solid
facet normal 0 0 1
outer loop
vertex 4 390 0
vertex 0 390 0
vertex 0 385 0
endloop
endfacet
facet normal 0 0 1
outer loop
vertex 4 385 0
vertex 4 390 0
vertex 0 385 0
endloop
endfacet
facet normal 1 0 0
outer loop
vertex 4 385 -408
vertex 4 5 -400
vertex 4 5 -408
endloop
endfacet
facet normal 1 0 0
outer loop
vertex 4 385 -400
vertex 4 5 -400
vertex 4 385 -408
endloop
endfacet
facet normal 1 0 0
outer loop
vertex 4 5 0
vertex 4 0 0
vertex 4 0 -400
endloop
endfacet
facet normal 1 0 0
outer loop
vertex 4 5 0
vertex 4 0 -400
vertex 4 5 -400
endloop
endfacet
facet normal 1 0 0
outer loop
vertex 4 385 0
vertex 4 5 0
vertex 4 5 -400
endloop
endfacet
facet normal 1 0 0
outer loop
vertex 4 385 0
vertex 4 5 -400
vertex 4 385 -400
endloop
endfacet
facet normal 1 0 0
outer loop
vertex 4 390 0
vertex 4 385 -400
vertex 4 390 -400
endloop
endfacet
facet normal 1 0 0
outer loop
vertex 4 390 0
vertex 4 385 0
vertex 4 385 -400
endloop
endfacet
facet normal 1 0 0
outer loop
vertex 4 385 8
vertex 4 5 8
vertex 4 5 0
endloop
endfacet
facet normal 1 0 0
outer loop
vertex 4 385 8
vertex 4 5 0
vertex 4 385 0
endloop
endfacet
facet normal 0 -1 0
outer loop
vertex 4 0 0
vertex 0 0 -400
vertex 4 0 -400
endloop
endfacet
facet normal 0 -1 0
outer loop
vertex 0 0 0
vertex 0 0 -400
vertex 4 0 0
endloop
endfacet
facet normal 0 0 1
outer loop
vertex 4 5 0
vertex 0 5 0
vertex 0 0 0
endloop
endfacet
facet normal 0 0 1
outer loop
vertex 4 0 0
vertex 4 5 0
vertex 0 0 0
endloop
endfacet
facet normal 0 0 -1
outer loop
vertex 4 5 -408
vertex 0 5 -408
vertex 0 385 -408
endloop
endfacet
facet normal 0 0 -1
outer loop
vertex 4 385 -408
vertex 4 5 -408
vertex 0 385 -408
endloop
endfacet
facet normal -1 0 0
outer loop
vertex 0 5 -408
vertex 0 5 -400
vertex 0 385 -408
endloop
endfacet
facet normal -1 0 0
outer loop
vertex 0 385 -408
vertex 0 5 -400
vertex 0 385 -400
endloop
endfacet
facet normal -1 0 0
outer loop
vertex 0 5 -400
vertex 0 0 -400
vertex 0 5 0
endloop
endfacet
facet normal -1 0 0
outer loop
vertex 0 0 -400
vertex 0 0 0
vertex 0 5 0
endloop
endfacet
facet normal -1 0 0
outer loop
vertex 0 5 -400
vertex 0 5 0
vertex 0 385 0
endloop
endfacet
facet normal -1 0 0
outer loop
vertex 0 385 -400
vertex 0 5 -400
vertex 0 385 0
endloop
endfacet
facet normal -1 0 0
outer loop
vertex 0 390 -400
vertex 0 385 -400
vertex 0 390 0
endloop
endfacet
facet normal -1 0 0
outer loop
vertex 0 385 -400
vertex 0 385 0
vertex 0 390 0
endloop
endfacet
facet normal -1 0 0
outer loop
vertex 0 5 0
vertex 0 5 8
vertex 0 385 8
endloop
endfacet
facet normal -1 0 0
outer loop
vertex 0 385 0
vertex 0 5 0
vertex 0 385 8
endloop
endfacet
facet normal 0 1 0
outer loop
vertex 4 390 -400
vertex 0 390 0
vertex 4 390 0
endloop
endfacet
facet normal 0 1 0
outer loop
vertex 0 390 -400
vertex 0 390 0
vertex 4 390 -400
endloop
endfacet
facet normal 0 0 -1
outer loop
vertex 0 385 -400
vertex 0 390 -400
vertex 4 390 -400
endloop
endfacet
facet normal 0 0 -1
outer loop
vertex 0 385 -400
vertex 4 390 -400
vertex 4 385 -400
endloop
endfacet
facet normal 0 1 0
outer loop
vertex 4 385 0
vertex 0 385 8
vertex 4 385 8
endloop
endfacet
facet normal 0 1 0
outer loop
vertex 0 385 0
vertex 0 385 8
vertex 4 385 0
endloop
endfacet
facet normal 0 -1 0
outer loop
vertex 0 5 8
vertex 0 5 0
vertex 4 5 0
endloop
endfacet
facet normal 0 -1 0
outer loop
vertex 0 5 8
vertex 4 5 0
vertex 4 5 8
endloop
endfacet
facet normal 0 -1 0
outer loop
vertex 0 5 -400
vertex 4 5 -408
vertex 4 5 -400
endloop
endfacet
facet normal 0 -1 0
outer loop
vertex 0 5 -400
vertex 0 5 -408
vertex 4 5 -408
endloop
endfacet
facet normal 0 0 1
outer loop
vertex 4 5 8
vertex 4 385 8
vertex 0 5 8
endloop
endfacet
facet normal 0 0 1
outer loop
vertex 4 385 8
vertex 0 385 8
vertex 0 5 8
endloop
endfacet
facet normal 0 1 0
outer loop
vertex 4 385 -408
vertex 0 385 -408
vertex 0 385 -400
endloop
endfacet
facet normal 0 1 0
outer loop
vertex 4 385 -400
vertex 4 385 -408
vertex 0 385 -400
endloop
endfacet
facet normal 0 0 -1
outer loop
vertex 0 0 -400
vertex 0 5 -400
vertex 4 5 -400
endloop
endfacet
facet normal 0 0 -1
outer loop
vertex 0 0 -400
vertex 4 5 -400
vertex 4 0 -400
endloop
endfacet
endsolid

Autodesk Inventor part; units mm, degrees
ref_plane "YZ Plane" through (0, 0, 0) normal (1, 0, 0) x (0, 1, 0)
ref_plane "XZ Plane" through (0, 0, 0) normal (0, 1, 0) x (-1, 0, 0)
ref_plane "XY Plane" through (0, 0, 0) normal (0, 0, 1) x (1, 0, 0)
sketch "Эскиз1" plane through (0, 0, 0) normal (1, 0, 0) x (0, 1, 0)
  line L0 (390, 0) -> (390, -400)
  line L1 (0, -400) -> (0, 0)
  line L2 (385, 8) -> (5, 8)
  line L3 (5, -408) -> (385, -408)
  line L4 (390, 0) -> (385, 0)
  line L5 (385, 8) -> (385, 0)
  line L6 (385, -408) -> (385, -400)
  line L7 (5, -408) -> (5, -400)
  line L8 (5, -400) -> (0, -400)
  line L9 (5, 0) -> (5, 8)
  line L10 (390, -400) -> (385, -400)
  line L11 (5, 0) -> (0, 0)
  dimension "d23" = 400
  dimension "d26" = 400
  dimension "d27" = 380
  dimension "d28" = 380
  dimension "d29" = 390
  dimension "d30" = 8
  dimension "d31" = 8
  dimension "d32" = 8
  dimension "d34" = 5
  dimension "d35" = 5
  dimension "d36" = 5
  dimension "d37" = 5
extrude "Выдавливание1" add sketch "Эскиз1" along normal blind 4
sketch "Эскиз2" plane through (4, 0, 0) normal (1, 0, 0) x (0, 0, -1)
  line L0 (160, 285) -> (240, 285)
  line L1 (240, 285) -> (240, 185)
  line L2 (240, 185) -> (160, 185)
  line L3 (160, 185) -> (160, 285)
  line L4 (117, 227) -> (138, 227)
  line L5 (138, 227) -> (138, 185)
  line L6 (138, 185) -> (117, 185)
  line L7 (117, 185) -> (117, 227)
  line L8 (343, 144) -> (382, 144)
  line L9 (382, 144) -> (382, 70)
  line L10 (382, 70) -> (343, 70)
  line L11 (343, 70) -> (343, 144)
  line L12 (192, 145) -> (282, 145)
  line L13 (282, 145) -> (282, 75)
  line L14 (282, 75) -> (192, 75)
  line L15 (192, 75) -> (192, 145)
  line L16 (277, 267) -> (333, 267)
  line L17 (333, 267) -> (333, 185)
  line L18 (333, 185) -> (277, 185)
  line L19 (277, 185) -> (277, 267)
  line L20 (408, 5) -> (408, 385) projected
  line L21 (0, 0) -> (400, 0) projected
  line L22 (-8, 385) -> (-8, 5) projected
  line L23 (400, 390) -> (0, 390) projected
  dimension "d38" = 42
  dimension "d39" = 21
  dimension "d40" = 74
  dimension "d41" = 39
  dimension "d44" = 90
  dimension "d45" = 70
  dimension "d46" = 80
  dimension "d47" = 100
  dimension "d48" = 82
  dimension "d49" = 56
  dimension "d50" = 65
  dimension "d51" = 70
  dimension "d52" = 200
  dimension "d53" = 75
  dimension "d54" = 168
  dimension "d55" = 105
  dimension "d56" = 185
  dimension "d57" = 125
  dimension "d58" = 185
  dimension "d59" = 75
properties part number "BackMountingWall"
